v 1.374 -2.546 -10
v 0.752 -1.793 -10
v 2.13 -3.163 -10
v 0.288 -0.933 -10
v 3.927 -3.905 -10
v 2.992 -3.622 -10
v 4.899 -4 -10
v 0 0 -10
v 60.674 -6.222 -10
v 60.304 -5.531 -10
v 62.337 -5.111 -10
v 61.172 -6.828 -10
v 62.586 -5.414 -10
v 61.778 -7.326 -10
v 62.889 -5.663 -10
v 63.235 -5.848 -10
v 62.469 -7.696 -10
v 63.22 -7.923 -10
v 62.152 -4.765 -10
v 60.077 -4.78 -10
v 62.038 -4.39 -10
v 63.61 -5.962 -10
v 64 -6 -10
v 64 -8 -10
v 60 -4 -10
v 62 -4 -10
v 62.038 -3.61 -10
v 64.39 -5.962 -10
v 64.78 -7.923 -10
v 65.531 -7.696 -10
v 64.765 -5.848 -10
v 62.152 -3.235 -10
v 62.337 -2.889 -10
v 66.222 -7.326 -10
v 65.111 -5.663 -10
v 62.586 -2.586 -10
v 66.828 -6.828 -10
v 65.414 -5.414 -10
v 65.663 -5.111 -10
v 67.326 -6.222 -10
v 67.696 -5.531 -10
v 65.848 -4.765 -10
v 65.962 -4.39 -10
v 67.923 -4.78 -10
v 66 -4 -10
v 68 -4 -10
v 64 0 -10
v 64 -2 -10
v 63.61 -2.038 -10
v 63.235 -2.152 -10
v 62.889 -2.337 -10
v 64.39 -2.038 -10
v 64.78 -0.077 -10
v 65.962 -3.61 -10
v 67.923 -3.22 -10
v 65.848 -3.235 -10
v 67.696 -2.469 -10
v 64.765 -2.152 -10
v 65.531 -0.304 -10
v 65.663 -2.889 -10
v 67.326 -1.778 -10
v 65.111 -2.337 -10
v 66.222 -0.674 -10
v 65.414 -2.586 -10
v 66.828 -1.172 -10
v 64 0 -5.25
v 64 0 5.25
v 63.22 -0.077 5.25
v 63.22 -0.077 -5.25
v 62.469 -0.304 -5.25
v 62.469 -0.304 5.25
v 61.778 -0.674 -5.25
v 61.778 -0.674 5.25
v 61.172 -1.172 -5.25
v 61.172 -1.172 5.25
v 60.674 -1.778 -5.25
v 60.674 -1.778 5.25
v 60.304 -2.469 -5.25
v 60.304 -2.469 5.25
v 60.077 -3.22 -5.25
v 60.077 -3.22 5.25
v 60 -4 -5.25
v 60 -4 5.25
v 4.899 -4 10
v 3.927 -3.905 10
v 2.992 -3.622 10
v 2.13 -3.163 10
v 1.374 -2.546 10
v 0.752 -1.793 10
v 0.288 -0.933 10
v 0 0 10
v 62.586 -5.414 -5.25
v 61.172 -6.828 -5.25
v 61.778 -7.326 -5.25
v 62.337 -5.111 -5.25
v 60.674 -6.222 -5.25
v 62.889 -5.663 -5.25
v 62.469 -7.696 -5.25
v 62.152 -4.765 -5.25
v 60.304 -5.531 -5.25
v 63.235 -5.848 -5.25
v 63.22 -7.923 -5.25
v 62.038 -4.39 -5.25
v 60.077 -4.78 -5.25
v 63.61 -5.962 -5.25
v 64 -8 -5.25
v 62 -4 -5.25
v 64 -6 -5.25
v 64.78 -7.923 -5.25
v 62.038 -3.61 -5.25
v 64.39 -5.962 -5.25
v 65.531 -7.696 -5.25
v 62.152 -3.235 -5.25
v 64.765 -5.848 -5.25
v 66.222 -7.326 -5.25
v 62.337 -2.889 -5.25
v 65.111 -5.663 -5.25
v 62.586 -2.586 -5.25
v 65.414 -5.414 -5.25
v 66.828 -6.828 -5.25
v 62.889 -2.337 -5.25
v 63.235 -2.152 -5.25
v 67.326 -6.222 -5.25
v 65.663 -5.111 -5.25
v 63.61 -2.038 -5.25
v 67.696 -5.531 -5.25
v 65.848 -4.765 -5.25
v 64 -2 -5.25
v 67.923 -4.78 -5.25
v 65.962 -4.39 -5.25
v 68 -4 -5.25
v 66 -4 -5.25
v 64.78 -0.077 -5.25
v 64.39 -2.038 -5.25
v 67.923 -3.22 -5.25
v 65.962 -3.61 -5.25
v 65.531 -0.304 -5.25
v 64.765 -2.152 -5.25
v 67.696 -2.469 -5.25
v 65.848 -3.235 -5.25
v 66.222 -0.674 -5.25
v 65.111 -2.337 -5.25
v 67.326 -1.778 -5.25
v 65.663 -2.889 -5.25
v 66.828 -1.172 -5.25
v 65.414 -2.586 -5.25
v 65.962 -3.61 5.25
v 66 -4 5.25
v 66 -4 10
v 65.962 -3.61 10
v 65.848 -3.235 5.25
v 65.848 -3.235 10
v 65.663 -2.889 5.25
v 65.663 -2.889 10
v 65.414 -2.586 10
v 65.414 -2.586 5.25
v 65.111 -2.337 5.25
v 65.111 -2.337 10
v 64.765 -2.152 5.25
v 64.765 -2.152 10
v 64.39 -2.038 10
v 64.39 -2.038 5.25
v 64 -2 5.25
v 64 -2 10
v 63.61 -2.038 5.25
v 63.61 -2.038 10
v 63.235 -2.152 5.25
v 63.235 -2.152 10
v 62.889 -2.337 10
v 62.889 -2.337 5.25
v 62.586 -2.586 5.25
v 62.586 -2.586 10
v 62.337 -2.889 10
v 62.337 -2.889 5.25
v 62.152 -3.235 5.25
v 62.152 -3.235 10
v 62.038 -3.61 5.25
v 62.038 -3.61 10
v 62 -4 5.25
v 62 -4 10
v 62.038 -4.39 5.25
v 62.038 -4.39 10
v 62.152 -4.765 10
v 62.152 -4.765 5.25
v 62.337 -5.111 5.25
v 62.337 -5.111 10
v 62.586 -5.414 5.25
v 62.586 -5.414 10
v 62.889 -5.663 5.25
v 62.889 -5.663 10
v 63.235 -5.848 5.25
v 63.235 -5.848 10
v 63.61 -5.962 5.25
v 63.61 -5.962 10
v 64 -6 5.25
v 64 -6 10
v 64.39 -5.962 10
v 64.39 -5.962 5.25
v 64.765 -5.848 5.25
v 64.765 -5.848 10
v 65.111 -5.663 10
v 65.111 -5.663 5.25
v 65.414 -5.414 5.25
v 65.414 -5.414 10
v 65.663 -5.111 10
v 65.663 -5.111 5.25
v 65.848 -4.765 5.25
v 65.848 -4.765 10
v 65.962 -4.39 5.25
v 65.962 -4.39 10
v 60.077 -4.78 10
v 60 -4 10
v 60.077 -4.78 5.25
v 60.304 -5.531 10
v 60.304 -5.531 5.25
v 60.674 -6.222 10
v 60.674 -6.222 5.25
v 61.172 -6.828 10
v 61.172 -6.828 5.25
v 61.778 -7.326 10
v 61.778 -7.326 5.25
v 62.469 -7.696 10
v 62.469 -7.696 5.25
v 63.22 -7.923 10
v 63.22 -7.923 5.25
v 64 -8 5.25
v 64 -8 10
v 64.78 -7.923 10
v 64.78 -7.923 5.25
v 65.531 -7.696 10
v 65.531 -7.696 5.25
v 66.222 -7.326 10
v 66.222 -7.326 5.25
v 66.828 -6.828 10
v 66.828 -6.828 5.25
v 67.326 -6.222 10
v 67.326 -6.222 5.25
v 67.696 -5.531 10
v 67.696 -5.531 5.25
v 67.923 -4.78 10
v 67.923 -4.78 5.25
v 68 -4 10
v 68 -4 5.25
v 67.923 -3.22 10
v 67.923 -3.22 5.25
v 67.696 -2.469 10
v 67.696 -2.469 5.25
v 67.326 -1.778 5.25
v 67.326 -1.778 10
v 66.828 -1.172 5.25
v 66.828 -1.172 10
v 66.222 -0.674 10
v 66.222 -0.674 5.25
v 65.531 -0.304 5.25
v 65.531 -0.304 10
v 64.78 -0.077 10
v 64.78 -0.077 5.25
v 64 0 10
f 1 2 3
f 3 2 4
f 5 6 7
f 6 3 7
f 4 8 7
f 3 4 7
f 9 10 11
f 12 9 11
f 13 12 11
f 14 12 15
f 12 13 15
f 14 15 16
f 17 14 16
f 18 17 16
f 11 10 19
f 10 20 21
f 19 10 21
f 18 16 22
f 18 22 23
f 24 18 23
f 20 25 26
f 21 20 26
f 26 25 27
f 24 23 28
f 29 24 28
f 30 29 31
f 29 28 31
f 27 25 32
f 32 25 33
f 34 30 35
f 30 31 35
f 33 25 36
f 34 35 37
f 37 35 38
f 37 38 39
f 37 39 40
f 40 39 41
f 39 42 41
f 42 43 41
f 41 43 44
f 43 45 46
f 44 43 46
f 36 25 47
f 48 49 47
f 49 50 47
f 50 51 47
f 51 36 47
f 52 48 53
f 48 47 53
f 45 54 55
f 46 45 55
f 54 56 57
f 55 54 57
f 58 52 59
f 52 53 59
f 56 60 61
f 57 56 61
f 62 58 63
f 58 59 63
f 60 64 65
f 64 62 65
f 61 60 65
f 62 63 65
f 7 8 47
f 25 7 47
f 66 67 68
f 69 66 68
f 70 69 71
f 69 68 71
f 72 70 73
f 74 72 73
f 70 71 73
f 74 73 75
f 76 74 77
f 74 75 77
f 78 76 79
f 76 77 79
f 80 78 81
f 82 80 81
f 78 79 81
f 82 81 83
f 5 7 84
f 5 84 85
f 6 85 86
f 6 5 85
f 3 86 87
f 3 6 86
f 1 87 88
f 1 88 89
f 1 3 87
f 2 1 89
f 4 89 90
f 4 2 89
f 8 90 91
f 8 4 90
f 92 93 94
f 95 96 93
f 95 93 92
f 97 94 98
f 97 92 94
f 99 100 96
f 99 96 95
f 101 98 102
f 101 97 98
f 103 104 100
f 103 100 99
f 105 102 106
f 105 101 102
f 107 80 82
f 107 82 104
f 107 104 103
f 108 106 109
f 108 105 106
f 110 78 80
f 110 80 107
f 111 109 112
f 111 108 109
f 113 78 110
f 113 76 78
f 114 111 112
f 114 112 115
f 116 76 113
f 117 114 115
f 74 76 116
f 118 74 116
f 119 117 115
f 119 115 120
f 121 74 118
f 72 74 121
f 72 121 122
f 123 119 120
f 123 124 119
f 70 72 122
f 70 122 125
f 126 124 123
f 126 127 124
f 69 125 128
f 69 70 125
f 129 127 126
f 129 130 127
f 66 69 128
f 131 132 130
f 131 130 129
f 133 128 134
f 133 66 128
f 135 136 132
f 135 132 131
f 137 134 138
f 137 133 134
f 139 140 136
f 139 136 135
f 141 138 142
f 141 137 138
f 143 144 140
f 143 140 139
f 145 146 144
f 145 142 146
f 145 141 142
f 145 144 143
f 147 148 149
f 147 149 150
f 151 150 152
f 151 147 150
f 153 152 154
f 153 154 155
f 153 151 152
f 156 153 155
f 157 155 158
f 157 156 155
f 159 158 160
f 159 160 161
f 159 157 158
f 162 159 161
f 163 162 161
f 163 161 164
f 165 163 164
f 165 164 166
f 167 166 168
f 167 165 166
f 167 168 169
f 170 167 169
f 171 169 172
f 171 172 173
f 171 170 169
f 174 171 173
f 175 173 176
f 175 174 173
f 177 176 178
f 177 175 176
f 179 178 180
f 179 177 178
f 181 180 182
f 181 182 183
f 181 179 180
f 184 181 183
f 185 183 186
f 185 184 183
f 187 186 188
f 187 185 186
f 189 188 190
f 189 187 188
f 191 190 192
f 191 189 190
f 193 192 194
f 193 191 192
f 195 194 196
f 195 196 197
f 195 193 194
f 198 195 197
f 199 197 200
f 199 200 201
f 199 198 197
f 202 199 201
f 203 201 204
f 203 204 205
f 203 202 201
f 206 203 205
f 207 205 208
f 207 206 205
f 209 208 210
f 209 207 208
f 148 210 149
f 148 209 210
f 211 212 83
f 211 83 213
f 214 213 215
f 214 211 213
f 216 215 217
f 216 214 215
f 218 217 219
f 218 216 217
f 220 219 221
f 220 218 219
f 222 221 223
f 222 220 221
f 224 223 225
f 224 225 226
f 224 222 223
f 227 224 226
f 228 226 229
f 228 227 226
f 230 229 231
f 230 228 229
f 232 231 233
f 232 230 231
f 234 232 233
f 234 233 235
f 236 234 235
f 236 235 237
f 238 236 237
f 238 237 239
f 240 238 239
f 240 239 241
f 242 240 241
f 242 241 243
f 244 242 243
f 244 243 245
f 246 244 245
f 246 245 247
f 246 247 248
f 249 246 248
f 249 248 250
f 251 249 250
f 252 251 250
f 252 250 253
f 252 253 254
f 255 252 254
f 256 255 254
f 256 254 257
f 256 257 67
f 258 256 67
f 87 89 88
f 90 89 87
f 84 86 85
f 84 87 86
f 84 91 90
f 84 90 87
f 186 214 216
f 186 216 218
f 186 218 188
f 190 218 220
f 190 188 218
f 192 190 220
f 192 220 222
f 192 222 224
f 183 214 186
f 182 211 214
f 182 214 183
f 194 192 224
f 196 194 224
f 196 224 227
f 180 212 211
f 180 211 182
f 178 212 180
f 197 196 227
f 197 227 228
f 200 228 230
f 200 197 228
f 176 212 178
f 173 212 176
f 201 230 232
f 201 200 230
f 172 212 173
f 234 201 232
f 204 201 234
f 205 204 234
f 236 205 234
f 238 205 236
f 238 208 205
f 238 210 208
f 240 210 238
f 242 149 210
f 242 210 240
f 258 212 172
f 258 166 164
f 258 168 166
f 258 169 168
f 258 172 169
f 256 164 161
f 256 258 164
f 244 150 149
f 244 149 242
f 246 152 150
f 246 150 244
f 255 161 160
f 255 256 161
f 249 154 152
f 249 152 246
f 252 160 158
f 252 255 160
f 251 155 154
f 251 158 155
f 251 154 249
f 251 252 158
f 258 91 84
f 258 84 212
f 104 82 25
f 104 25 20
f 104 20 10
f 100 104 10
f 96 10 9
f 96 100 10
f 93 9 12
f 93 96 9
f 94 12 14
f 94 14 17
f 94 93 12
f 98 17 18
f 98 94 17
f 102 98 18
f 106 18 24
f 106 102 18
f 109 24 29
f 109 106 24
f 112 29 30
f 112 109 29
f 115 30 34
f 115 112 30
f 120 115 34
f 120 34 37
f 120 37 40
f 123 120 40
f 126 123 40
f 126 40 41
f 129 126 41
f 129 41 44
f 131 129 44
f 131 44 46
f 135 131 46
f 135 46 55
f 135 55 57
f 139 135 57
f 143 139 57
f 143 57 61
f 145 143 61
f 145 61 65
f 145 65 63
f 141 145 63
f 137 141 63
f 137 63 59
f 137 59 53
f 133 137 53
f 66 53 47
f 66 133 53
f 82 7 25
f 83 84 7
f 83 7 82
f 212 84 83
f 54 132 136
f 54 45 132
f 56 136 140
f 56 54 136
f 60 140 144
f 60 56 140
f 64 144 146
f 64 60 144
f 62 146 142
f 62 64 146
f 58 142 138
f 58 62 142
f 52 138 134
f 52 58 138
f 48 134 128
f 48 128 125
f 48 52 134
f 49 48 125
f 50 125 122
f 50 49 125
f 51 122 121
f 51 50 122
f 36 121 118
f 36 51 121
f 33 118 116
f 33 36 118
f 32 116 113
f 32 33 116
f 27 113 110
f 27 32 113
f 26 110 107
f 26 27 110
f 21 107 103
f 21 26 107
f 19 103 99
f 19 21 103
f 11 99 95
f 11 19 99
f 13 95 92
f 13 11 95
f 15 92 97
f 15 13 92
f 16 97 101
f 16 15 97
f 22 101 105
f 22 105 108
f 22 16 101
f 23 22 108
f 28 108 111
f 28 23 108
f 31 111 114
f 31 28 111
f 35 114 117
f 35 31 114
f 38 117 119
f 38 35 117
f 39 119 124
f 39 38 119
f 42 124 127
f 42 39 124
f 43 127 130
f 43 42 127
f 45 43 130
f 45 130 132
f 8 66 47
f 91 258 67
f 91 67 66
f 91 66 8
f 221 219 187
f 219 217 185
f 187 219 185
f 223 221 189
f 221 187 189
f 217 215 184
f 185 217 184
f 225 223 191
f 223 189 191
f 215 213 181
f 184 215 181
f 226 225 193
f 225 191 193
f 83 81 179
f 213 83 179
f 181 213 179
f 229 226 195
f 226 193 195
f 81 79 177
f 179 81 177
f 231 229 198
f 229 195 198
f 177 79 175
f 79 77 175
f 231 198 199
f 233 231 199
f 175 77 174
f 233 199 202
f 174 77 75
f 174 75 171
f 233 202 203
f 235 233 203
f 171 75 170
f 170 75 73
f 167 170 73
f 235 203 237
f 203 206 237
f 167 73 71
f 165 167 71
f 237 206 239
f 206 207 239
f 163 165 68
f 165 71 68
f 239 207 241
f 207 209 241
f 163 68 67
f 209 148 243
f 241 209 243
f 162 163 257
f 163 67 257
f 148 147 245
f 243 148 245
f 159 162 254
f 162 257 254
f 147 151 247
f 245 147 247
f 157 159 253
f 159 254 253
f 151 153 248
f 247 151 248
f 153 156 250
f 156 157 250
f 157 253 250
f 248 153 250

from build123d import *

# Parameters (mm, degrees)
F0_R        = 2
F1_DEPTH    = 10
F2_DEPTH    = 5.25
F3_T1_DEPTH = 44.4948974279


# Not quite as in the source:
# - a fillet or chamfer that OpenCascade refuses, or shapes differently, is made with other operations: its cross-section is extruded or revolved along the edge and cut away or added


with BuildPart() as f1:
    # F0 (on Top) → F1 (new body, symmetric)
    with BuildSketch(Plane.XY):
        with BuildLine():
            Line((64, 0), (0, 0))
            Line((0, 0), (0, -4))
            Line((0, -4), (60, -4))
            ThreePointArc((60, -4), (61.1715728753, -1.1715728753), (64, 0))
        make_face()
        with BuildLine():
            ThreePointArc((68, -4), (66.8284271247, -1.1715728753), (64, 0))
            ThreePointArc((64, 0), (61.1715728753, -1.1715728753), (60, -4))
            ThreePointArc((60, -4), (64, -8), (68, -4))
        make_face()
        with Locations((64, -4)):
            Circle(F0_R, mode=Mode.SUBTRACT)
    extrude(amount=F1_DEPTH, both=True)

    # F0 (on Top) → F2 (cut, symmetric)
    with BuildSketch(Plane.XY):
        with BuildLine():
            ThreePointArc((68, -4), (66.8284271247, -1.1715728753), (64, 0))
            ThreePointArc((64, 0), (61.1715728753, -1.1715728753), (60, -4))
            ThreePointArc((60, -4), (64, -8), (68, -4))
        make_face()
        with Locations((64, -4)):
            Circle(F0_R, mode=Mode.SUBTRACT)
    extrude(amount=F2_DEPTH, both=True, mode=Mode.SUBTRACT)

    # F3: fillet of radius 5 on 1 edges, made by hand

    # F3_s2 → F3_t1 (cut)
    with BuildSketch(Plane.XY.offset(-22.2474487139)):
        with BuildLine():
            ThreePointArc((4.8989794856, -4), (1.7367018254, -2.8729833462), (0, 0))
            Line((0, 0), (0, -4))
            Line((0, -4), (4.8989794856, -4))
        make_face()
    extrude(amount=F3_T1_DEPTH, mode=Mode.SUBTRACT)


solid = f1.part
